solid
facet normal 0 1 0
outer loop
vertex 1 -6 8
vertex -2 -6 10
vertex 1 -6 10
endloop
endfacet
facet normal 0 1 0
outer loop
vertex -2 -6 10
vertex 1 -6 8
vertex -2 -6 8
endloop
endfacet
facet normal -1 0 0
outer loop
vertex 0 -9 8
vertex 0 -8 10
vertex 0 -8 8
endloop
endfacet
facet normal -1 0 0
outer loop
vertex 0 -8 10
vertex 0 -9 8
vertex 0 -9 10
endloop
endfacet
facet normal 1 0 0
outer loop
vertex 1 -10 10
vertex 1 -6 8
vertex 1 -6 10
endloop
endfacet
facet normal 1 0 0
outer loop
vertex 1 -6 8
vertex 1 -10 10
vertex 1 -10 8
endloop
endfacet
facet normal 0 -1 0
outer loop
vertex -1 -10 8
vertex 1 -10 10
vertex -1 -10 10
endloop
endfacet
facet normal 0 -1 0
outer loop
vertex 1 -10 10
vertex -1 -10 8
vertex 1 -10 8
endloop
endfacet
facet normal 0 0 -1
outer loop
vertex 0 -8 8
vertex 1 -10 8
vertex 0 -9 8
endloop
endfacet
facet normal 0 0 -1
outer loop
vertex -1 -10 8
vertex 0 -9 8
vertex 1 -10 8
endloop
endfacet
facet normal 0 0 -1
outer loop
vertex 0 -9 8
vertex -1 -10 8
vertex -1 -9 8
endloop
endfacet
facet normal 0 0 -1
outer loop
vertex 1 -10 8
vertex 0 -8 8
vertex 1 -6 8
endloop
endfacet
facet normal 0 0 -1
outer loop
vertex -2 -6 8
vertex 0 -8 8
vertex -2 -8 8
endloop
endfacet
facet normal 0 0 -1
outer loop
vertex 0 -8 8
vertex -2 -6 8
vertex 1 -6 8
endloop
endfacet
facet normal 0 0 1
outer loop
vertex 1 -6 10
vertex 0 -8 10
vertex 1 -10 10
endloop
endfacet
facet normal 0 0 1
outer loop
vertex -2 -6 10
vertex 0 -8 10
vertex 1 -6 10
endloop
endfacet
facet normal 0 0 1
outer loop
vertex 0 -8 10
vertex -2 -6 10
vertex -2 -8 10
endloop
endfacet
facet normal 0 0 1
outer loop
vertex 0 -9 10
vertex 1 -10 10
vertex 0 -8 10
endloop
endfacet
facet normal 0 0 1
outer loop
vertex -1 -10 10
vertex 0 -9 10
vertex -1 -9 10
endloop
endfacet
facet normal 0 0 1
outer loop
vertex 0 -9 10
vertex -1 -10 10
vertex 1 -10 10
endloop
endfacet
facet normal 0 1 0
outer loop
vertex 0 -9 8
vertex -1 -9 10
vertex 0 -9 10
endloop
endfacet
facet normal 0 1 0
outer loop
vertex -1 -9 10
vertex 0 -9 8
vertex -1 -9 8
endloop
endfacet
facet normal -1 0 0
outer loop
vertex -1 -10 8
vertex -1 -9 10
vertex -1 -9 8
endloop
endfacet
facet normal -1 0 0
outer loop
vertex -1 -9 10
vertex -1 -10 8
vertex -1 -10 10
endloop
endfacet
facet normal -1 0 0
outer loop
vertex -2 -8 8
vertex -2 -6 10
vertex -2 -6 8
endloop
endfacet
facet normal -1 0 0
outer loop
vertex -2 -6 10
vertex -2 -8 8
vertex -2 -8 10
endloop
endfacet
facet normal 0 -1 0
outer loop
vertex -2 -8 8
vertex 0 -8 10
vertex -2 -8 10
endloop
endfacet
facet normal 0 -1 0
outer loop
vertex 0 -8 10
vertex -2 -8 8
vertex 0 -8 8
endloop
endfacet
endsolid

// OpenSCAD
// file: base3d.scad
//Copyright Stephen Morrisson 2017

module xyzCube(c, x, y, z)
{
    color(c) cube([x, y, z], false);
}

module rotCube(c, rotX, rotY, rotZ, x, y, z)
{
    rotate([rotX, rotY, rotZ]) xyzCube(c, x, y, z);
}

module transCube(c, xOffset, yOffset, zOffset, x, y, z)
{
    translate([xOffset, yOffset, zOffset]) xyzCube(c, x, y, z);
}

module trCube(c, rotX, rotY, rotZ, xO, yO, zO, x, y, z)
{
    translate([xO, yO, zO])
    rotate([rotX, rotY, rotZ])
    xyzCube(c, x, y, z);
}

/*
trCube("yellow", 0,0,0, 0,0,0, 2, 3, 4);
trCube("green", 45, 45, 45, 4, 3, 1, 5, 6, 7);
trCube("blue", 0, 0, 45, 20, 0, 0, 5, 6, 7);
trCube("orange", 0,0,0, -10, 0, 0, 1,1,1);
trCube("orange", 45,0,0, -15, 0, 0, 1,1,1);
trCube("orange", 0,45,0, -20, 0, 0, 1,1,1);
trCube("orange", 0,0,45, -25, 0, 0, 1,1,1);
*/

module rhCylinder(c, rRadius, z)
{
    color(c) translate([rRadius, rRadius, 0.5 * z])
        cylinder(h=z, r=rRadius, center=true);
}
//rhCylinder("blue", 2, 1);
//translate([-15,-10,0]) rhCylinder("red", 2, 1);


module transCylinder(c, xO, yO, zO, rRadius, z)
{
    translate([xO,yO,zO]) rhCylinder(c, rRadius, z);
}
transCylinder("yellow", 0,0,0, 5, 2);
transCylinder("green", -15,15,0, 5, 2);

/*
rot cylinder: does it make sense?
module rotCylinder(c, rotX, rotY, rotZ, rRadius, z)
{
    rotate([rotX,rotY,rotZ])
        rhCylinder(c, rRadius, z);
}
translate([10, 0, 0]) rotCylinder("orange", 45,0,0, 4, 3);
translate([20, 0, 0]) rotCylinder("orange", 45,0,0, 4, 3);
translate([30, 0, 0]) rotCylinder("orange", 45,0,0, 4, 3);
//rotCylinder("orange", 45,45,0, 4, 3);
//rotCylinder("orange", 45,45,45, 4, 3);

module trCylinder(c, rotX, rotY, rotZ, xO, yO, zO, rRadius, z)
{
    translate([xO, yO, zO])
    {
        rotCylinder(c, rotX, rotY, rotZ, rRadius, z);
    }
}
//trCylinder("blue", 90,0,0, 10, 0, 0, 4, 3);
//trCylinder("blue", 45,45,0, 20, 0, 0, 4, 3);
//trCylinder("blue", 45,45,45, 30, 0, 0, 4, 3);
//trCylinder("red", 45,0,0, 0, 15, 0, 4, 3);
//trCylinder("red", 0,45,0, 0, 25, 0, 4, 3);
//trCylinder("red", 0,0,45, 0, 35, 0, 4, 3);
*/
// main file
// Copyright Stephen Morrisson 2017

use <base3d.scad>

module xyzUBar(cB, cL, cR, xBase, yBase, zBase, 
    xLeft, zLeft, xRight, zRight)
{
    xyzCube(cB, xBase, yBase, zBase);
    transCube(cL, 0, 0, zBase, xLeft, yBase, zLeft);
    transCube(cR, xBase - xRight, 0, zBase, xRight, yBase, zRight);
}

//xyzUBar("red", "green", "blue", 10, 14, 1, 2, 3, 4, 5);

module transUBar(c, xO, yO, zO, xB, yB, zB, xL, zL, xR, zR)
{
    translate([xO, yO, zO]) xyzUBar(c, c, c, xB, yB, zB, xL, zL, xR, zR);
}
//transUBar("orange", -10, -10, -1,  4, 2, 1, 1, 1, 2, 2);


module rotUBar(c, rotX, rotY, rotZ, xO, yO, zO,
    xB, yB, zB, xL, zL, xR, zR)
{
    rotate([rotX, rotY, rotZ]) transUBar(c, xO, yO, zO, xB, yB, zB,
        xL, zL, xR, zR);
}
rotUBar("orange", 90, 180, 270, -10, -10, -1,  4, 2, 1, 1, 1, 2, 2);
